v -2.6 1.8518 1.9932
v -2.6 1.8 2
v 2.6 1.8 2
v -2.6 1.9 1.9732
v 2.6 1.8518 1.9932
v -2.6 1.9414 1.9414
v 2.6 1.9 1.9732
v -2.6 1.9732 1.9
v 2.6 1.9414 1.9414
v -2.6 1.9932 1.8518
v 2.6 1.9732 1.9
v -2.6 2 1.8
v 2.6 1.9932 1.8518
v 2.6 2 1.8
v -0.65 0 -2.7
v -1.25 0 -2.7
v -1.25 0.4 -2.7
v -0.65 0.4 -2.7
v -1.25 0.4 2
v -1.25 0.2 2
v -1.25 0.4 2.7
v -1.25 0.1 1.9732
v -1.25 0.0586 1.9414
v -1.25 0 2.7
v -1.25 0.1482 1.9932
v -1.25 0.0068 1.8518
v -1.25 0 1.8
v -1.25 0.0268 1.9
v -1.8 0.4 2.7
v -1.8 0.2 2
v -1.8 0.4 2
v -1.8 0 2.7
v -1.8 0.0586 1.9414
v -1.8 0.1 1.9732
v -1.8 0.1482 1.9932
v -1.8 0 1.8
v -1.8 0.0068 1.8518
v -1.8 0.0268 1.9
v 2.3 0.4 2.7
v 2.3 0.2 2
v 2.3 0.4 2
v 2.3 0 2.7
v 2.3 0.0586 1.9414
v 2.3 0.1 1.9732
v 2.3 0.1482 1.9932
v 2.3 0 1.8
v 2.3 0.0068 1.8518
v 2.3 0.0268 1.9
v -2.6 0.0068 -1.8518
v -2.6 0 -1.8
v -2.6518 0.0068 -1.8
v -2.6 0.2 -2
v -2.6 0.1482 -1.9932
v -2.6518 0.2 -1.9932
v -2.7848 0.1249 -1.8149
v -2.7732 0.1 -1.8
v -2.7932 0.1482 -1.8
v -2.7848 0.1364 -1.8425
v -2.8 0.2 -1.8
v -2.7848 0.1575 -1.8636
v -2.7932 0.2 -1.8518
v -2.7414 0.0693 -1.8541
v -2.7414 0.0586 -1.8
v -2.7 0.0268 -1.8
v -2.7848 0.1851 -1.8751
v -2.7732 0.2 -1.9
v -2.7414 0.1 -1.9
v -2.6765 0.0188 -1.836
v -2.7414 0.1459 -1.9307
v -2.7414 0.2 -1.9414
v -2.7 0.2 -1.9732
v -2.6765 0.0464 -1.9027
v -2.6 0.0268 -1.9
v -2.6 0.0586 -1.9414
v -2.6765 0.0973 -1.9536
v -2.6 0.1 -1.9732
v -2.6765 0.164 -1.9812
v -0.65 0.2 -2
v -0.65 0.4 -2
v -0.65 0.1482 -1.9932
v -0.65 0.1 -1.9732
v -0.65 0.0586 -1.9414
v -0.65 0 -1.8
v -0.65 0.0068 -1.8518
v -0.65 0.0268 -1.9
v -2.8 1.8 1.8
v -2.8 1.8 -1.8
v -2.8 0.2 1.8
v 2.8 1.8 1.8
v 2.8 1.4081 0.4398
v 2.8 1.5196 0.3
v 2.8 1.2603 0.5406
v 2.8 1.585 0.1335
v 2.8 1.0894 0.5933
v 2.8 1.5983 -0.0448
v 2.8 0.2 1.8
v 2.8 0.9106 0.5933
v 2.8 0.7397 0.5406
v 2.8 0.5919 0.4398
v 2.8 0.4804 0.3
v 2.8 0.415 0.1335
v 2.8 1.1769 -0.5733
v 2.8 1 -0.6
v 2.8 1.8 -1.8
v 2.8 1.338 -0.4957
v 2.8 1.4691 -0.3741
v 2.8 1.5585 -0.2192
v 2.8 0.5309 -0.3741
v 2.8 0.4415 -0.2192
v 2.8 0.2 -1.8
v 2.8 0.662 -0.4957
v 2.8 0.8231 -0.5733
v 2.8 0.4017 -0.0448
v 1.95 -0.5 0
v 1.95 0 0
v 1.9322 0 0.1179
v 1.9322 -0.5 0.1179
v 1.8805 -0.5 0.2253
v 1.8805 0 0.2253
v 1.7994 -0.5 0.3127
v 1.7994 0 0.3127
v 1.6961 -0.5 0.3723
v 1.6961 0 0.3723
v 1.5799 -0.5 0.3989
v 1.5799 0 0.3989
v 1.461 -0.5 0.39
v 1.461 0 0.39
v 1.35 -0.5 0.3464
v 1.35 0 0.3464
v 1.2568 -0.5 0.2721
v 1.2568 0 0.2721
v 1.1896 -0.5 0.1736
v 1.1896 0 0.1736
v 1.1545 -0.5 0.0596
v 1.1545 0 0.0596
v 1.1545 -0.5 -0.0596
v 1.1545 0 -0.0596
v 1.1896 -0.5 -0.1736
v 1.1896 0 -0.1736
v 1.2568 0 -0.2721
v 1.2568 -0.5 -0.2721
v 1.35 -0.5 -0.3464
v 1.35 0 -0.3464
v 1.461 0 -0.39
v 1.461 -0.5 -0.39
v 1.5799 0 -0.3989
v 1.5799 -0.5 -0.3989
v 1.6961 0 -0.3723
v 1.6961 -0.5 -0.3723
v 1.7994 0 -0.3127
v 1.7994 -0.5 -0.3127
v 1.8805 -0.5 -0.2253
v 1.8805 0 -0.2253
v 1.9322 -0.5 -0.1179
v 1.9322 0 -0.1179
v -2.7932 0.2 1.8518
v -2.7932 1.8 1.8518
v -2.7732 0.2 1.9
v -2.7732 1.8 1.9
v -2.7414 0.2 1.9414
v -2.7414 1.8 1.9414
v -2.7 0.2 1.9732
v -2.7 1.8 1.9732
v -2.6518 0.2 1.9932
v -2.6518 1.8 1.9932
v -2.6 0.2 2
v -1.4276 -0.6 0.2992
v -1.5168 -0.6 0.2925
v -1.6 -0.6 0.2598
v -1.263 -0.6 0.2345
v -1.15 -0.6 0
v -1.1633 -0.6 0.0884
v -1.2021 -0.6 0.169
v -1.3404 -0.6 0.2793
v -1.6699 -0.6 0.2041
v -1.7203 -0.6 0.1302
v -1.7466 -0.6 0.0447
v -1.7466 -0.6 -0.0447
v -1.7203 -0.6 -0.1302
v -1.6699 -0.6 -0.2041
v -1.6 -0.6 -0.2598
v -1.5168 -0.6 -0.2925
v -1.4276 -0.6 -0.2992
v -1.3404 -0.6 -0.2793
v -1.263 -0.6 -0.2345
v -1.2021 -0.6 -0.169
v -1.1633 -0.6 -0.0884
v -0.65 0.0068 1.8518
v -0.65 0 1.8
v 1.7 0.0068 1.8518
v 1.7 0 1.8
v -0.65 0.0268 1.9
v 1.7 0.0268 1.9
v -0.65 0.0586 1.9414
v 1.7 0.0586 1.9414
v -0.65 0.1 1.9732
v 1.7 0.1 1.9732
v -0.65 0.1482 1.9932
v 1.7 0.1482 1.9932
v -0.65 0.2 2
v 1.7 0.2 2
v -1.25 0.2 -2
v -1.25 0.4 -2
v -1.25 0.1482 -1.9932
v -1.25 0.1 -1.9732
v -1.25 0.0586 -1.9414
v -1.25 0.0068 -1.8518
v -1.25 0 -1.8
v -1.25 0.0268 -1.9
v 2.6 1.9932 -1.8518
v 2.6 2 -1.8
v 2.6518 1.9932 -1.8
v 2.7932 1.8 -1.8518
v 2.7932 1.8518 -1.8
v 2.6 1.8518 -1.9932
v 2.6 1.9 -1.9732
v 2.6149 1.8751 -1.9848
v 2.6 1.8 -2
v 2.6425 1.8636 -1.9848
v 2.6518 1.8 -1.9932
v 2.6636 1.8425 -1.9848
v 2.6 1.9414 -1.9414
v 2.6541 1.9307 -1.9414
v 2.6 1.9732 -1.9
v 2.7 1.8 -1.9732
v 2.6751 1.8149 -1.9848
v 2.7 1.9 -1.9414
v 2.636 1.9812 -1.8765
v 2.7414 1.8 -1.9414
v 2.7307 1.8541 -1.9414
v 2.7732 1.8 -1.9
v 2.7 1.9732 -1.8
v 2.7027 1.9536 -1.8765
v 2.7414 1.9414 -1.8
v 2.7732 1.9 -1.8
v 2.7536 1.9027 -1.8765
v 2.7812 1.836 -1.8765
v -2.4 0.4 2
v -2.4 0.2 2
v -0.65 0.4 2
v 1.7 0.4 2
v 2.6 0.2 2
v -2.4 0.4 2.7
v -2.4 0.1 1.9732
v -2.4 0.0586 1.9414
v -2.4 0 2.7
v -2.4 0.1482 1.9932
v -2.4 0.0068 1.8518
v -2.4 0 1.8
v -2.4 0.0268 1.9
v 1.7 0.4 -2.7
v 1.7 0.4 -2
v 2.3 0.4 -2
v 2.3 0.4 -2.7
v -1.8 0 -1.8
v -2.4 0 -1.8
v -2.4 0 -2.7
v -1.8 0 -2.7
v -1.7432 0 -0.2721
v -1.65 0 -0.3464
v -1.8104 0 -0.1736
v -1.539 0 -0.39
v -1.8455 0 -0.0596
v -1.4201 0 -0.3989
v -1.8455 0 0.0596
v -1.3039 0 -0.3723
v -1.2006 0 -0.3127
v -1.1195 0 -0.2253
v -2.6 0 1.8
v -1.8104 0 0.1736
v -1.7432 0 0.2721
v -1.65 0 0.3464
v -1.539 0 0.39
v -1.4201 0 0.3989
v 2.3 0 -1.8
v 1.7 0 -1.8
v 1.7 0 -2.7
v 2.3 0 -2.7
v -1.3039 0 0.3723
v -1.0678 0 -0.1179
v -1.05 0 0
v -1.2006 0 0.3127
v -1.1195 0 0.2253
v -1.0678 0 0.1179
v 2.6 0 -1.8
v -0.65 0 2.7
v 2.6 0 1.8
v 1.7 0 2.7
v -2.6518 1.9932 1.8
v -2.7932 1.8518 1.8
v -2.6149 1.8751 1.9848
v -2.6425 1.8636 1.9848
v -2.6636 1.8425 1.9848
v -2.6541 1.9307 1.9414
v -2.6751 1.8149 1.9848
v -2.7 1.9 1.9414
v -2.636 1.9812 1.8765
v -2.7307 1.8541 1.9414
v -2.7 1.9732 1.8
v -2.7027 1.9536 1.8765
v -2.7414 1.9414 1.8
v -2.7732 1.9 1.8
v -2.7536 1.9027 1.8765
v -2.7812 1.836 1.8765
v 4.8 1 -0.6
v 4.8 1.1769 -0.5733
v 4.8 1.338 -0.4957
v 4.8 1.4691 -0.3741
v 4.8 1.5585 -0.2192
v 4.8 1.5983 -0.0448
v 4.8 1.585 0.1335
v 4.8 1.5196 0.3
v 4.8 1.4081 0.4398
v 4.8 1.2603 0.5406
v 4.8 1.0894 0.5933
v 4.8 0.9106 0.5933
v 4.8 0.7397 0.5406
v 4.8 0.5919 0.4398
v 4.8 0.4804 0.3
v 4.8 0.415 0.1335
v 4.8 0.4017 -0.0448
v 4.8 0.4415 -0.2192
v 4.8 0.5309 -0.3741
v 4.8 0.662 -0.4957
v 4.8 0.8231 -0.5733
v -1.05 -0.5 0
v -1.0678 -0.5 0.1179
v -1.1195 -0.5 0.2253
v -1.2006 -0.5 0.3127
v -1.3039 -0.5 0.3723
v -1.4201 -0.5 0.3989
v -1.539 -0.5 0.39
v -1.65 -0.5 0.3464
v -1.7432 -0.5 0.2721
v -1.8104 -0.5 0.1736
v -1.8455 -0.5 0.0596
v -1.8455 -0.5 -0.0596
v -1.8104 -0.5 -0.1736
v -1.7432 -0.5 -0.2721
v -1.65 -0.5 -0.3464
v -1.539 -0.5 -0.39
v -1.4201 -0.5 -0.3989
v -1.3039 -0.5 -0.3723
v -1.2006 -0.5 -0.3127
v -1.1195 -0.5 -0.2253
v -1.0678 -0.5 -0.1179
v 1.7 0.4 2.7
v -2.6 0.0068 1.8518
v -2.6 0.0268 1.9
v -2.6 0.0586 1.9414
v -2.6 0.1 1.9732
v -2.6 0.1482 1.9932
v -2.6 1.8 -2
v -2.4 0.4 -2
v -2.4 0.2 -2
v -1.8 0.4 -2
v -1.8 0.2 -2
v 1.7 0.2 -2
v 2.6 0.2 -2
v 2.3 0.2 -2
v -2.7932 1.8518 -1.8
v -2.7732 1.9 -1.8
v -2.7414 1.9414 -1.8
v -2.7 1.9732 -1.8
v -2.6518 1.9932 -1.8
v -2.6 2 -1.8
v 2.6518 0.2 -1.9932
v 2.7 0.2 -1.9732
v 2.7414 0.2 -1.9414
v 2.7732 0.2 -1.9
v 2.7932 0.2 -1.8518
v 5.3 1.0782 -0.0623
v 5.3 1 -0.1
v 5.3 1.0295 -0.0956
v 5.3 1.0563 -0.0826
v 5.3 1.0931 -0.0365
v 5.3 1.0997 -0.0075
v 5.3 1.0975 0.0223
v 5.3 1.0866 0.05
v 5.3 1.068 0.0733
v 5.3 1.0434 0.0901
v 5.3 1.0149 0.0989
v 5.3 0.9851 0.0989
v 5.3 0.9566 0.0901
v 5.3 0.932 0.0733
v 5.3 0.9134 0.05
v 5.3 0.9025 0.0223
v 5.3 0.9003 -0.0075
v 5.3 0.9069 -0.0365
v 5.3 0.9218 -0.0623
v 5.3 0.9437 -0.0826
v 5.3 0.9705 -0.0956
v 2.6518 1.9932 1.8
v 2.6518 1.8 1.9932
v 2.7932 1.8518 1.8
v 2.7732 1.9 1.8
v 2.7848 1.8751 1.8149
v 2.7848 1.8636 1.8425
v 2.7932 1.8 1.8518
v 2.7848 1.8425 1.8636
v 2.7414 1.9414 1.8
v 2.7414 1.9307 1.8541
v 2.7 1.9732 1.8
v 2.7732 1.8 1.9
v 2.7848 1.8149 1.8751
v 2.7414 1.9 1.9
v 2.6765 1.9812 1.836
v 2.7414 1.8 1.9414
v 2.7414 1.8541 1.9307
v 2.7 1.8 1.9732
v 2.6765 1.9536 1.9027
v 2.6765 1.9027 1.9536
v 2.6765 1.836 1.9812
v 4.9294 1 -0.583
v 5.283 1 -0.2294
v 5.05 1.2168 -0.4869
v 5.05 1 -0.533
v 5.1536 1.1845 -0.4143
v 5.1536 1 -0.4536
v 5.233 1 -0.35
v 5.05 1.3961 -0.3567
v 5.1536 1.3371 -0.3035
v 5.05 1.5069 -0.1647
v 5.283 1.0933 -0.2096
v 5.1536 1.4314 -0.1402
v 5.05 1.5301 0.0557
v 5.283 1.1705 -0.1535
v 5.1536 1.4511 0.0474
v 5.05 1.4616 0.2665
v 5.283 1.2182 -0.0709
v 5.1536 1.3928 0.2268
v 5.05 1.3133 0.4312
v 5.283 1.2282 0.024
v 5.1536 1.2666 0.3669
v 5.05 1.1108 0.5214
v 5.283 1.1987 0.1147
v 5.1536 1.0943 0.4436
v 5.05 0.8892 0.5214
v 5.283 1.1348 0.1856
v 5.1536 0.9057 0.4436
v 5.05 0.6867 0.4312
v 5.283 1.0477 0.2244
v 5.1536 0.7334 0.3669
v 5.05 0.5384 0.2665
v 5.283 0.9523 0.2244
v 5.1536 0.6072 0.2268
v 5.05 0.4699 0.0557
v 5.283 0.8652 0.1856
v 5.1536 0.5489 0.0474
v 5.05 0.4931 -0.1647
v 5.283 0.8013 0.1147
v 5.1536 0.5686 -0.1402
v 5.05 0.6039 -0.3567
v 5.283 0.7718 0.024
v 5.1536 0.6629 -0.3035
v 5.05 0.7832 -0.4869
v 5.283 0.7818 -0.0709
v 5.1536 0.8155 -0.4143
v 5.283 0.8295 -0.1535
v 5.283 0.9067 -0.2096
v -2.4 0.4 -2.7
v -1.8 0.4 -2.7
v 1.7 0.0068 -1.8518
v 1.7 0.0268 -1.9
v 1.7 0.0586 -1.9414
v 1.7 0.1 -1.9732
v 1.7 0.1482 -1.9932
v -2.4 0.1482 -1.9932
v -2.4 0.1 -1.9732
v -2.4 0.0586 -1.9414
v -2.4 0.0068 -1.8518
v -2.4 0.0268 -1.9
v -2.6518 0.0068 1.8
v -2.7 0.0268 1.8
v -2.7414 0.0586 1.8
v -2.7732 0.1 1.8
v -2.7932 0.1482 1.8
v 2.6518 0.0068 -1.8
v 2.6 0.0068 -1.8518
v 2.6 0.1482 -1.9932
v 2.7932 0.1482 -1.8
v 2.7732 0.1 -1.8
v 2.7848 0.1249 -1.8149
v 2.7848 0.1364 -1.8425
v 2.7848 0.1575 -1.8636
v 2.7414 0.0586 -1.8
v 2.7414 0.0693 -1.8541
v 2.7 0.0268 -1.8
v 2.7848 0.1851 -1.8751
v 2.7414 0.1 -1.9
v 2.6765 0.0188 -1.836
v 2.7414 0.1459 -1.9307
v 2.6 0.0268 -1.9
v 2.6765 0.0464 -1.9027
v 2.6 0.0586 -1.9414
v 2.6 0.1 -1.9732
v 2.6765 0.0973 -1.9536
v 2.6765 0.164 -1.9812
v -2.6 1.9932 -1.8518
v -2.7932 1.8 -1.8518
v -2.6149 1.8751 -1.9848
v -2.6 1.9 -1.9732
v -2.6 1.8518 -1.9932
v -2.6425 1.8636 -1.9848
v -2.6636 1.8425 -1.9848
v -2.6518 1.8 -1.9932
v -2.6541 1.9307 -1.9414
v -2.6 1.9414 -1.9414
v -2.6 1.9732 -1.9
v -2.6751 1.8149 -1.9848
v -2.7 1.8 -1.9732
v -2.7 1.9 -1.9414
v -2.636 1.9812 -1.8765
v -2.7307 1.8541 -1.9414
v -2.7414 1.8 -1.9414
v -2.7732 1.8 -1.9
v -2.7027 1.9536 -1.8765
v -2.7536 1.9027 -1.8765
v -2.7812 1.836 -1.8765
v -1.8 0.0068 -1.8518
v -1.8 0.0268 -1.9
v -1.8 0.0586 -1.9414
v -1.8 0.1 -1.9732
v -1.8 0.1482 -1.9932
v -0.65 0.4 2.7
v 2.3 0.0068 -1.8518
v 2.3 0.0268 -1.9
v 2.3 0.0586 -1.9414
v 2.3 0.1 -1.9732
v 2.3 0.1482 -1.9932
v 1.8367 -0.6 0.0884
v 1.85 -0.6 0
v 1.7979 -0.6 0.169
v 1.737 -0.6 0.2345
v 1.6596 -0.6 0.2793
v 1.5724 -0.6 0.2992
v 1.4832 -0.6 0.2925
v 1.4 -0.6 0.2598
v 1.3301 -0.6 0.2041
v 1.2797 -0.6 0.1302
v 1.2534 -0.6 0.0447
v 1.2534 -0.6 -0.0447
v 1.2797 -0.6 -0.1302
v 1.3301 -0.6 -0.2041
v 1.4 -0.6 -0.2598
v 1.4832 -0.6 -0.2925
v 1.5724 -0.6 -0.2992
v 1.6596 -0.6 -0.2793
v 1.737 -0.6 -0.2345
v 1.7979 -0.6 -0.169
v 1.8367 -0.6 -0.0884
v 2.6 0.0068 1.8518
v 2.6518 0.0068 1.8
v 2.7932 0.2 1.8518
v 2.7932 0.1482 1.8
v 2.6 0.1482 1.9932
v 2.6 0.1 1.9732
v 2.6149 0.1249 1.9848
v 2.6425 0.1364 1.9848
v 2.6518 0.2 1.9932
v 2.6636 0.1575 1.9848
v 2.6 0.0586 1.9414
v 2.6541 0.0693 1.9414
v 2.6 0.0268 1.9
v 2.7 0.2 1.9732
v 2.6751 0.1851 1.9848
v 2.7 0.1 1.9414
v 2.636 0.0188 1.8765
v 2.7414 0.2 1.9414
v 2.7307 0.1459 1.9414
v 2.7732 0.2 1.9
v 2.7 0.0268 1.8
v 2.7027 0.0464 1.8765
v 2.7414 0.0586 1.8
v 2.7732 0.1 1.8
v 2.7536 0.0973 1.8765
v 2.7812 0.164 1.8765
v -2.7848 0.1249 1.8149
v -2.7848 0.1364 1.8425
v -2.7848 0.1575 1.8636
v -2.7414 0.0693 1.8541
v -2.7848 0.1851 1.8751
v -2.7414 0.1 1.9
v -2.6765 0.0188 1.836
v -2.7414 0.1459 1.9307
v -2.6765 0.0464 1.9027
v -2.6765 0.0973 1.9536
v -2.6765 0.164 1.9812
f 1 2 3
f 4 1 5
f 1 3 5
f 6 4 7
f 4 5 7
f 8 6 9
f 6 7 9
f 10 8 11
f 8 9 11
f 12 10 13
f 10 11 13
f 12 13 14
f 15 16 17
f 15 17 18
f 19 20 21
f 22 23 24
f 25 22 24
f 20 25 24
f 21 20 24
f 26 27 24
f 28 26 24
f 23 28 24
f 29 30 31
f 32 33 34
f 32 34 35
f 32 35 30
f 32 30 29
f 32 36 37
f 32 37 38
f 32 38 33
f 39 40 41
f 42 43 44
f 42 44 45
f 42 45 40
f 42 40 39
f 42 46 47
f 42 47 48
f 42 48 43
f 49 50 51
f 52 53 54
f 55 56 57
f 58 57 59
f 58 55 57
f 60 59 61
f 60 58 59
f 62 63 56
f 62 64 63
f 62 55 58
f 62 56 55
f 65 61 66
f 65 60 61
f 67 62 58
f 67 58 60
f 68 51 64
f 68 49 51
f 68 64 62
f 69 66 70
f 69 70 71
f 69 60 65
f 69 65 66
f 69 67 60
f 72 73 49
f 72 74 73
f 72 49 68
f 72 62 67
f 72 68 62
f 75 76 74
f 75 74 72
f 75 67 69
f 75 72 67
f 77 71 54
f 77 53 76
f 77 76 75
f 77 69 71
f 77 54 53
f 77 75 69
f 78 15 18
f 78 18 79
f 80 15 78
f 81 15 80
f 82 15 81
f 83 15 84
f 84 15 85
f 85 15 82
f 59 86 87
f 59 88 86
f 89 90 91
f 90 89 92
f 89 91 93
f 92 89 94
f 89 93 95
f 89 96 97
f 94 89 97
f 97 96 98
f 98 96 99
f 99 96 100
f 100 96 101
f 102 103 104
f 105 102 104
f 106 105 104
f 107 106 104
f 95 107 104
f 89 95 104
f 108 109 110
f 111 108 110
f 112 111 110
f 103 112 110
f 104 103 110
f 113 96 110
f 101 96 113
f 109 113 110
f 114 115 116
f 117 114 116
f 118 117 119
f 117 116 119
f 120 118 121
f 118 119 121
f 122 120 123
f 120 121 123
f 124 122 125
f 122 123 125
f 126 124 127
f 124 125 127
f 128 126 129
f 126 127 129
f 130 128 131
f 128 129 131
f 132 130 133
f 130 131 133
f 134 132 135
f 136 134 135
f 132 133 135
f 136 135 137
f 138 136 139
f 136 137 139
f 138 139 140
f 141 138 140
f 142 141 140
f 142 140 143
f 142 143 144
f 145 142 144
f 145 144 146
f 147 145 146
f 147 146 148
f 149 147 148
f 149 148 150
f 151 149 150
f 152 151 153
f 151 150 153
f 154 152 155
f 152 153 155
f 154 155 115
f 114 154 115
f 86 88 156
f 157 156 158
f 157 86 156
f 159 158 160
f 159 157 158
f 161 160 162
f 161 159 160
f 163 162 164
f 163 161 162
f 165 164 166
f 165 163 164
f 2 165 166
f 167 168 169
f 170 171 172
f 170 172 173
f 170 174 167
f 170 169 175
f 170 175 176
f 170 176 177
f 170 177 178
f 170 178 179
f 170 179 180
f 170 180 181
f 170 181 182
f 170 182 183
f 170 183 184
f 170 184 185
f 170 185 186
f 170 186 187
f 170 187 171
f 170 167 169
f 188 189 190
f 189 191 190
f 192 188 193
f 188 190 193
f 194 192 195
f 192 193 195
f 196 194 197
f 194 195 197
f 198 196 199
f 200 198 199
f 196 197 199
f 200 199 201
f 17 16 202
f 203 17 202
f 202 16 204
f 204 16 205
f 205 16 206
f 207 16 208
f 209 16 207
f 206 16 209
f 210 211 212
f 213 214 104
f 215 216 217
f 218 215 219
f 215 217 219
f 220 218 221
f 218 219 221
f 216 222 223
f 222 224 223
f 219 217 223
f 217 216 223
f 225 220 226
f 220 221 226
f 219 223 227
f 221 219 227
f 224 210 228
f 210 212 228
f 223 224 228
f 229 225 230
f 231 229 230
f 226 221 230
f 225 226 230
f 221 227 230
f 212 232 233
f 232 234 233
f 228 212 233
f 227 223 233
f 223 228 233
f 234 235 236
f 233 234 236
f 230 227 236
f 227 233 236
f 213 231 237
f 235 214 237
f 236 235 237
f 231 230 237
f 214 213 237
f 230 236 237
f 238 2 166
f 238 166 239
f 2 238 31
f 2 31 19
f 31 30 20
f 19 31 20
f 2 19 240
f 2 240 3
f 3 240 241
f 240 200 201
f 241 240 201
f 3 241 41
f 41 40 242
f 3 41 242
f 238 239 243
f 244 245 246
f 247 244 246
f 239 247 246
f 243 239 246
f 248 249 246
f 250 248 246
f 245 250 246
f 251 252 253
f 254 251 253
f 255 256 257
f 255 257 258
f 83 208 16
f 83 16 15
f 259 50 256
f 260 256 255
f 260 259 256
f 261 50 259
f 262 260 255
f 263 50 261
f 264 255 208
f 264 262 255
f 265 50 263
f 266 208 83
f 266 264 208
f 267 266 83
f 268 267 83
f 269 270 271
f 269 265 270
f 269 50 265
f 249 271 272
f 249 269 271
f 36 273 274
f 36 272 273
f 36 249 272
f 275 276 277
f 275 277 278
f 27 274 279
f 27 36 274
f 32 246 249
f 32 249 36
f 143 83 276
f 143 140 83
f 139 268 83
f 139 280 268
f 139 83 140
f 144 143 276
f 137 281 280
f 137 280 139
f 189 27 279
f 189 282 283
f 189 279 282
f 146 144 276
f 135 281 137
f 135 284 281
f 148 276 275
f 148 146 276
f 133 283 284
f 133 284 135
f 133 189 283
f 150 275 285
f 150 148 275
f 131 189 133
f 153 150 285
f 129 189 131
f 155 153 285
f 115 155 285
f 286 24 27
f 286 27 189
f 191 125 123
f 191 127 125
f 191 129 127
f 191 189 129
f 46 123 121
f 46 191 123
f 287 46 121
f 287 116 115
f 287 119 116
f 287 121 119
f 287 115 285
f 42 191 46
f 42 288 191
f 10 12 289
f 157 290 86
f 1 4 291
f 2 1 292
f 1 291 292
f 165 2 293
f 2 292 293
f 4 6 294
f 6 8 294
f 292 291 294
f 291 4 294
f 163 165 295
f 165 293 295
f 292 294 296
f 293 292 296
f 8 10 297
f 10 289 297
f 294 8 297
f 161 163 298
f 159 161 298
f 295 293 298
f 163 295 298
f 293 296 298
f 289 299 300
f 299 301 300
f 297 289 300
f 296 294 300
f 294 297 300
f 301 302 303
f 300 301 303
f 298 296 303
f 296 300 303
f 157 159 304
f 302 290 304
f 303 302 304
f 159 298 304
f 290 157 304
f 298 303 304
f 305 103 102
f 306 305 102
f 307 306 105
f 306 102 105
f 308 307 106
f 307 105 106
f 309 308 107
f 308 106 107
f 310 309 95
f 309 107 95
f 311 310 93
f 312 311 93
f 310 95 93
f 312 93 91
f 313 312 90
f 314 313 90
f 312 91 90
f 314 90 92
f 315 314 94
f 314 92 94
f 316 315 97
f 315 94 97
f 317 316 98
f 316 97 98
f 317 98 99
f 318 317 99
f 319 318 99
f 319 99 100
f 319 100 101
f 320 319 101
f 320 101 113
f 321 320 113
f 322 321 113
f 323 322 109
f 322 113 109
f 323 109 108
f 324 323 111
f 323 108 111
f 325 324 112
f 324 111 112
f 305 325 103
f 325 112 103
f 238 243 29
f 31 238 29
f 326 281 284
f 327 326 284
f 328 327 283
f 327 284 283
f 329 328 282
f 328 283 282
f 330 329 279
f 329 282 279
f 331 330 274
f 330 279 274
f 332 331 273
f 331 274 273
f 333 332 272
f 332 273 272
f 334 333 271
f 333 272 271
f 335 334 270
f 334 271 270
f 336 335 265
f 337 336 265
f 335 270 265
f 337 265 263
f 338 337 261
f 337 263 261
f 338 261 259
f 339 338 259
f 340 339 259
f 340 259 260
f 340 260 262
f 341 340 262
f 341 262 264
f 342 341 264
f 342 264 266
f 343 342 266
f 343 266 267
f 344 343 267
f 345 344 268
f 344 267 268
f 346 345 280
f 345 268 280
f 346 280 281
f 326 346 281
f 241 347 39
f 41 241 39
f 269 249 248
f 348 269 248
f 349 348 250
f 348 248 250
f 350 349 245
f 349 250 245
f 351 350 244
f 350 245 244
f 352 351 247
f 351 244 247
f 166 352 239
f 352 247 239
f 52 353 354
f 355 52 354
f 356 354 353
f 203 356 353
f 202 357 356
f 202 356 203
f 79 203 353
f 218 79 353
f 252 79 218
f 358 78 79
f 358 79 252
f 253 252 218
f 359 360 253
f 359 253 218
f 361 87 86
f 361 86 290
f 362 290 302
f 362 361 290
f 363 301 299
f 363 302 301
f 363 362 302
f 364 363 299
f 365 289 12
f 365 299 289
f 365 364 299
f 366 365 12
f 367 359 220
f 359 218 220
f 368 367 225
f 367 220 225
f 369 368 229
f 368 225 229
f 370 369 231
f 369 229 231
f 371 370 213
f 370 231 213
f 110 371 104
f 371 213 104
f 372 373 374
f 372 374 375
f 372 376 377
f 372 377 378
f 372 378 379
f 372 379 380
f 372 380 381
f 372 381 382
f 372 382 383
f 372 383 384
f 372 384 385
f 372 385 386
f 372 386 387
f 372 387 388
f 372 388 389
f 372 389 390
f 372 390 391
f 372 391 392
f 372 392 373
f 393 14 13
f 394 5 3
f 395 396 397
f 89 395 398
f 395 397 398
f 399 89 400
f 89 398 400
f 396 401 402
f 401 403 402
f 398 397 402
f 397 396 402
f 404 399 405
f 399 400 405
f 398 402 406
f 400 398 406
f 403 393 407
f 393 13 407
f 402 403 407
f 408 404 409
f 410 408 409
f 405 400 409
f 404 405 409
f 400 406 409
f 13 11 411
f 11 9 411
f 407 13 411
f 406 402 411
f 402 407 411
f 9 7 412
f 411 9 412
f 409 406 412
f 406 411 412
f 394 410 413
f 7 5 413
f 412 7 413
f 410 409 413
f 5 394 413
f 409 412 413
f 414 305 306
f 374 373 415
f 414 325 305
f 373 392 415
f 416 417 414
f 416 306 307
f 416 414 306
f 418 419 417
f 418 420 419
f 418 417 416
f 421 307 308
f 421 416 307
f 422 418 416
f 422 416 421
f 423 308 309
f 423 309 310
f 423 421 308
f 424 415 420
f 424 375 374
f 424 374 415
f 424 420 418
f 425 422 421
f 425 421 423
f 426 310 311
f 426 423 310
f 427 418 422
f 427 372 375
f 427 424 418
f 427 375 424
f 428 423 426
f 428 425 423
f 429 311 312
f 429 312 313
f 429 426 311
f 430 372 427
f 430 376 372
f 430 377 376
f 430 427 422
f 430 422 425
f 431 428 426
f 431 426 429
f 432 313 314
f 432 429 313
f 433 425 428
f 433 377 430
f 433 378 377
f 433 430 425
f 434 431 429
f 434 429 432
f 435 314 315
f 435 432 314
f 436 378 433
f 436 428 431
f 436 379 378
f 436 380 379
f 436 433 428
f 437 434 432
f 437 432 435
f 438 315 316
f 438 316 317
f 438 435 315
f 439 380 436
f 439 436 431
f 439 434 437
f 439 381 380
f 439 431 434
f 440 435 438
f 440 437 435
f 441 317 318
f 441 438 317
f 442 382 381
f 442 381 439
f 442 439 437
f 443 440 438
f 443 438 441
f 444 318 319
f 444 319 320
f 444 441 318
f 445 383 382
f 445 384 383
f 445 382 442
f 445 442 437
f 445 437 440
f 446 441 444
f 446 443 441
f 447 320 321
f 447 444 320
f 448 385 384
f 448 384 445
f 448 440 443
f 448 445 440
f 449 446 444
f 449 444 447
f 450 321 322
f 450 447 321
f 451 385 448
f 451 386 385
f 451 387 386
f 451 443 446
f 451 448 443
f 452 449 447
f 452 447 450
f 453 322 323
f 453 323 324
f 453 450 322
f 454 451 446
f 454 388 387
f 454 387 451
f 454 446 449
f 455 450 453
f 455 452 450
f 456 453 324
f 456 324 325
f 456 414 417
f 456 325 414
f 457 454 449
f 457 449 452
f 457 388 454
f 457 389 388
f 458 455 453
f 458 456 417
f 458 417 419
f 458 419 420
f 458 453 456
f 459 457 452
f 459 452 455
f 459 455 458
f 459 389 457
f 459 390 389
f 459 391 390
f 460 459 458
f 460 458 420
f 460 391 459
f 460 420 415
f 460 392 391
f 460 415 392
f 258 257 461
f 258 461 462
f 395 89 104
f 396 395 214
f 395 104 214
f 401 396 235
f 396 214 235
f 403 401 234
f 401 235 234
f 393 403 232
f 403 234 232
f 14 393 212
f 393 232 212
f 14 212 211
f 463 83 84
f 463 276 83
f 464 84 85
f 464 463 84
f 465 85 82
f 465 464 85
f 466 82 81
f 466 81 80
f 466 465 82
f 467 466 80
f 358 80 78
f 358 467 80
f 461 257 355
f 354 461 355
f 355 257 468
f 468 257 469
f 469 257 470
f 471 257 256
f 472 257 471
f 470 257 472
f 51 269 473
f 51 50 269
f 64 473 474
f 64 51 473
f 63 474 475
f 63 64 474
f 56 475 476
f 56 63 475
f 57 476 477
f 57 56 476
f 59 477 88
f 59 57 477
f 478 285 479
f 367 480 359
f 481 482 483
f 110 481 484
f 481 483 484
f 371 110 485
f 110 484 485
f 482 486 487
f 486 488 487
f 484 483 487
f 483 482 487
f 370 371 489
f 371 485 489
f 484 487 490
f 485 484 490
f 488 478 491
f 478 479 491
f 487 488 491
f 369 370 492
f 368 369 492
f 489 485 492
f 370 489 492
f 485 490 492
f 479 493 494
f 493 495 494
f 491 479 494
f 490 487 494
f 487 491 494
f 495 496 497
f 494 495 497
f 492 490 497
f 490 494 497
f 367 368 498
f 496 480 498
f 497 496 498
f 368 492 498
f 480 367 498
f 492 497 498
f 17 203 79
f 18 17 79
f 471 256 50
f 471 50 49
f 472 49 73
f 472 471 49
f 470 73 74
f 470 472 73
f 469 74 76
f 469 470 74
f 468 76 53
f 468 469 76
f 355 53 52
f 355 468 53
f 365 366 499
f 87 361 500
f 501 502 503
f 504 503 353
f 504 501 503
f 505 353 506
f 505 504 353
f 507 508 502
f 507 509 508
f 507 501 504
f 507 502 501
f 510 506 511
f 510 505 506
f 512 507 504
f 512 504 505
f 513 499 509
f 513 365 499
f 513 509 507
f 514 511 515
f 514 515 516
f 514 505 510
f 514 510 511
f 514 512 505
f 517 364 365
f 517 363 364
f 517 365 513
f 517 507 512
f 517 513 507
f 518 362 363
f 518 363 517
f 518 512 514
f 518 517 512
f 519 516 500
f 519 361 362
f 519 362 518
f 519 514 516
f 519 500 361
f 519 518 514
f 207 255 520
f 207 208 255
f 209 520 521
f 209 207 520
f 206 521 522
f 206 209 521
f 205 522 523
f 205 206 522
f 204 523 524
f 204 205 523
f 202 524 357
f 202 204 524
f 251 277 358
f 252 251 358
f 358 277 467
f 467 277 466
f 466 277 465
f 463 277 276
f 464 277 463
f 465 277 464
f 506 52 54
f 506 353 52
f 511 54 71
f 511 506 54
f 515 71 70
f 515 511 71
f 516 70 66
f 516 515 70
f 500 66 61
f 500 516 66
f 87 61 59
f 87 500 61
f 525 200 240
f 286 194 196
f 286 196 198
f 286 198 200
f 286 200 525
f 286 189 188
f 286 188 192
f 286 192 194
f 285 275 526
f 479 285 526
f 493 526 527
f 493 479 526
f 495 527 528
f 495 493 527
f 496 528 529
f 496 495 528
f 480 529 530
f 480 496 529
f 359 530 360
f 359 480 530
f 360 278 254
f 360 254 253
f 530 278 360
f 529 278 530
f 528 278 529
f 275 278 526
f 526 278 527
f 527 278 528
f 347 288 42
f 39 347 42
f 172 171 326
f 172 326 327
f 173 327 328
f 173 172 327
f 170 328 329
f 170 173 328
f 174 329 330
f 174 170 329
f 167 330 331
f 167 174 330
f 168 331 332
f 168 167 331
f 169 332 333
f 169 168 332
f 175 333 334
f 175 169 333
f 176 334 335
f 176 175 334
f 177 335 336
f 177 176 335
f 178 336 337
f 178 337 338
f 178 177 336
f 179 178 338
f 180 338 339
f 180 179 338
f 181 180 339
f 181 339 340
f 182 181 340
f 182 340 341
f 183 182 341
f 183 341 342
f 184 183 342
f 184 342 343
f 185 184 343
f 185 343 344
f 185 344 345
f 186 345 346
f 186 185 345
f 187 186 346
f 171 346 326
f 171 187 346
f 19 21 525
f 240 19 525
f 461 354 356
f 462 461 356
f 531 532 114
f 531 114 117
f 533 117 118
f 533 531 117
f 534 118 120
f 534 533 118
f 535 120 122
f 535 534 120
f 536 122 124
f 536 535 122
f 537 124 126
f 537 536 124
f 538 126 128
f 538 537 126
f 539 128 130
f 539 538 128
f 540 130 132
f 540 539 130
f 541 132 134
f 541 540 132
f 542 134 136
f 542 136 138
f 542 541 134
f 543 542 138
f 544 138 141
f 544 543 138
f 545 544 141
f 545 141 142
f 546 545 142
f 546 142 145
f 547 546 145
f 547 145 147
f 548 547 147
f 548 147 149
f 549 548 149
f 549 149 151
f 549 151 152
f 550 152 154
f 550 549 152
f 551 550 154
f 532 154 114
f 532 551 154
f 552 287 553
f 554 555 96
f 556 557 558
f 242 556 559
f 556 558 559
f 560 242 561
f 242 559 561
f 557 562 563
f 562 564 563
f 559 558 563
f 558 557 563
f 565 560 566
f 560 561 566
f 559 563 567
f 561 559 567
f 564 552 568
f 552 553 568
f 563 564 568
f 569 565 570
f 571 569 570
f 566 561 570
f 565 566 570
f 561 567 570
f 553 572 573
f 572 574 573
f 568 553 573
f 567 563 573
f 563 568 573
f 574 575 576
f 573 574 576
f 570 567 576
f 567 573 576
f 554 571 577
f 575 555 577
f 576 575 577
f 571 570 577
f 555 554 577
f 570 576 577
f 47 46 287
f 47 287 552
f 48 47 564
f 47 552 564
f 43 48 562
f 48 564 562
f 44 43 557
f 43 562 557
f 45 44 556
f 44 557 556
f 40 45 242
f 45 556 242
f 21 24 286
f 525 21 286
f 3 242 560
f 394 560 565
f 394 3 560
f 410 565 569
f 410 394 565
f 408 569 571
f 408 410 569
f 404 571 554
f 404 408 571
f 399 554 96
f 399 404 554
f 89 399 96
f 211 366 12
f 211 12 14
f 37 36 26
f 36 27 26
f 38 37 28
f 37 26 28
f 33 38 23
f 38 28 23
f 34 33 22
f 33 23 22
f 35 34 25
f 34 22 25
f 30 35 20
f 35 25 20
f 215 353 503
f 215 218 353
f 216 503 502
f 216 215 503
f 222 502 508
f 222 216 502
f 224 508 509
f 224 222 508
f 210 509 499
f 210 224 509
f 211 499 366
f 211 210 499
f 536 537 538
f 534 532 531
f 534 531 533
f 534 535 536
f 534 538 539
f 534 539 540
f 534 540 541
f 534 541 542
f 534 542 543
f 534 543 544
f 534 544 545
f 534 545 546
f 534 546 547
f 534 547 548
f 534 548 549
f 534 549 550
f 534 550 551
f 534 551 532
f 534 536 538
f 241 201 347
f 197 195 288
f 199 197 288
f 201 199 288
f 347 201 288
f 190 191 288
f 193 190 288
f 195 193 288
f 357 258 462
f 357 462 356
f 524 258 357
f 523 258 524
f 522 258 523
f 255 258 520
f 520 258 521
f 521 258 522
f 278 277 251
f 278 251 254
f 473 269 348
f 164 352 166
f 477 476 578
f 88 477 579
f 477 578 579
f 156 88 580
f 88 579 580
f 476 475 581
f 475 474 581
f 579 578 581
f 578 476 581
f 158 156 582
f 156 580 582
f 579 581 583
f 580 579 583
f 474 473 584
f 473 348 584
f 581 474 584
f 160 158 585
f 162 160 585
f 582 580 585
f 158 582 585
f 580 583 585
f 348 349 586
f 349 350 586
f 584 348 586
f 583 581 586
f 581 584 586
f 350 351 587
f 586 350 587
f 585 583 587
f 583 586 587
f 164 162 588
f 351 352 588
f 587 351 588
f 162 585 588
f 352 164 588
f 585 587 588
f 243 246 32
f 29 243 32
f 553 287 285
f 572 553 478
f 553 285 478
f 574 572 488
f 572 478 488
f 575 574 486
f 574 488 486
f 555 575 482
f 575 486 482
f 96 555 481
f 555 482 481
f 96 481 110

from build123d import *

# Parameters (mm, degrees)
SKETCH_1_W      = 5.6
SKETCH_1_H      = 4
EXTRUDE_1_DEPTH = 2
SKETCH_2_R      = 0.6
EXTRUDE_2_DEPTH = 2.5
FILLET_1_R      = 0.5
SKETCH_3_W      = 0.6
SKETCH_3_H      = 5.4
EXTRUDE_3_DEPTH = 0.4
SKETCH_4_R      = 0.4
EXTRUDE_4_DEPTH = 0.6
CHAMFER_1_SIZE  = 0.1
FILLET_2_R      = 0.2


with BuildPart() as part:
    # Эскиз1 → Бобышка-Вытянуть1 (new body)
    with BuildSketch(Plane(origin=(0, 0, 0), x_dir=(1, 0, 0), z_dir=(0, 1, 0))):
        Rectangle(SKETCH_1_W, SKETCH_1_H)
    extrude(amount=EXTRUDE_1_DEPTH)

    # Эскиз2 → Бобышка-Вытянуть2 (add)
    with BuildSketch(Plane(origin=(2.8, 0, 0), x_dir=(0, 0, -1), z_dir=(1, 0, 0))):
        with Locations((0, 1)):
            Circle(SKETCH_2_R)
    extrude(amount=EXTRUDE_2_DEPTH)

    # Скругление1
    fillet_1_edges = [part.edges().sort_by_distance(p)[0] for p in [
        (5.3, 1, 0.6),
    ]]
    fillet(fillet_1_edges, radius=FILLET_1_R)

    # Эскиз3 → Бобышка-Вытянуть3 (add)
    with BuildSketch(Plane.XZ):
        with Locations((-2.1, 0)):
            Rectangle(SKETCH_3_W, SKETCH_3_H)
        with Locations((-0.95, 0)):
            Rectangle(SKETCH_3_W, SKETCH_3_H)
        with Locations((2, 0)):
            Rectangle(SKETCH_3_W, SKETCH_3_H)
    extrude(amount=-EXTRUDE_3_DEPTH)

    # Эскиз4 → Бобышка-Вытянуть4 (add)
    with BuildSketch(Plane.XZ):
        with Locations((-1.45, 0)):
            Circle(SKETCH_4_R)
        with Locations((1.55, 0)):
            Circle(SKETCH_4_R)
    extrude(amount=EXTRUDE_4_DEPTH)

    # Фаска1
    chamfer_1_edges = [part.edges().sort_by_distance(p)[0] for p in [
        (-1.85, -0.6, 0),
        (1.15, -0.6, 0),
    ]]
    chamfer(chamfer_1_edges, length=CHAMFER_1_SIZE)

    # Скругление2
    fillet_2_edges = [part.edges().sort_by_distance(p)[0] for p in [
        (-2.8, 2, 0),
        (0, 2, 2),
        (-1.525, 0, 2),
        (-2.6, 0, -2),
        (2.8, 2, 0),
        (-1.525, 0, -2),
        (0.525, 0, 2),
        (-2.6, 0, 2),
        (-2.8, 0, 0),
        (2.55, 0, -2),
        (2.8, 0, 0),
        (0.525, 0, -2),
        (2.55, 0, 2),
        (0, 2, -2),
        (2.8, 1, 2),
        (-2.8, 1, 2),
        (-2.8, 1, -2),
        (2.8, 1, -2),
    ]]
    fillet(fillet_2_edges, radius=FILLET_2_R)


solid = part.part
